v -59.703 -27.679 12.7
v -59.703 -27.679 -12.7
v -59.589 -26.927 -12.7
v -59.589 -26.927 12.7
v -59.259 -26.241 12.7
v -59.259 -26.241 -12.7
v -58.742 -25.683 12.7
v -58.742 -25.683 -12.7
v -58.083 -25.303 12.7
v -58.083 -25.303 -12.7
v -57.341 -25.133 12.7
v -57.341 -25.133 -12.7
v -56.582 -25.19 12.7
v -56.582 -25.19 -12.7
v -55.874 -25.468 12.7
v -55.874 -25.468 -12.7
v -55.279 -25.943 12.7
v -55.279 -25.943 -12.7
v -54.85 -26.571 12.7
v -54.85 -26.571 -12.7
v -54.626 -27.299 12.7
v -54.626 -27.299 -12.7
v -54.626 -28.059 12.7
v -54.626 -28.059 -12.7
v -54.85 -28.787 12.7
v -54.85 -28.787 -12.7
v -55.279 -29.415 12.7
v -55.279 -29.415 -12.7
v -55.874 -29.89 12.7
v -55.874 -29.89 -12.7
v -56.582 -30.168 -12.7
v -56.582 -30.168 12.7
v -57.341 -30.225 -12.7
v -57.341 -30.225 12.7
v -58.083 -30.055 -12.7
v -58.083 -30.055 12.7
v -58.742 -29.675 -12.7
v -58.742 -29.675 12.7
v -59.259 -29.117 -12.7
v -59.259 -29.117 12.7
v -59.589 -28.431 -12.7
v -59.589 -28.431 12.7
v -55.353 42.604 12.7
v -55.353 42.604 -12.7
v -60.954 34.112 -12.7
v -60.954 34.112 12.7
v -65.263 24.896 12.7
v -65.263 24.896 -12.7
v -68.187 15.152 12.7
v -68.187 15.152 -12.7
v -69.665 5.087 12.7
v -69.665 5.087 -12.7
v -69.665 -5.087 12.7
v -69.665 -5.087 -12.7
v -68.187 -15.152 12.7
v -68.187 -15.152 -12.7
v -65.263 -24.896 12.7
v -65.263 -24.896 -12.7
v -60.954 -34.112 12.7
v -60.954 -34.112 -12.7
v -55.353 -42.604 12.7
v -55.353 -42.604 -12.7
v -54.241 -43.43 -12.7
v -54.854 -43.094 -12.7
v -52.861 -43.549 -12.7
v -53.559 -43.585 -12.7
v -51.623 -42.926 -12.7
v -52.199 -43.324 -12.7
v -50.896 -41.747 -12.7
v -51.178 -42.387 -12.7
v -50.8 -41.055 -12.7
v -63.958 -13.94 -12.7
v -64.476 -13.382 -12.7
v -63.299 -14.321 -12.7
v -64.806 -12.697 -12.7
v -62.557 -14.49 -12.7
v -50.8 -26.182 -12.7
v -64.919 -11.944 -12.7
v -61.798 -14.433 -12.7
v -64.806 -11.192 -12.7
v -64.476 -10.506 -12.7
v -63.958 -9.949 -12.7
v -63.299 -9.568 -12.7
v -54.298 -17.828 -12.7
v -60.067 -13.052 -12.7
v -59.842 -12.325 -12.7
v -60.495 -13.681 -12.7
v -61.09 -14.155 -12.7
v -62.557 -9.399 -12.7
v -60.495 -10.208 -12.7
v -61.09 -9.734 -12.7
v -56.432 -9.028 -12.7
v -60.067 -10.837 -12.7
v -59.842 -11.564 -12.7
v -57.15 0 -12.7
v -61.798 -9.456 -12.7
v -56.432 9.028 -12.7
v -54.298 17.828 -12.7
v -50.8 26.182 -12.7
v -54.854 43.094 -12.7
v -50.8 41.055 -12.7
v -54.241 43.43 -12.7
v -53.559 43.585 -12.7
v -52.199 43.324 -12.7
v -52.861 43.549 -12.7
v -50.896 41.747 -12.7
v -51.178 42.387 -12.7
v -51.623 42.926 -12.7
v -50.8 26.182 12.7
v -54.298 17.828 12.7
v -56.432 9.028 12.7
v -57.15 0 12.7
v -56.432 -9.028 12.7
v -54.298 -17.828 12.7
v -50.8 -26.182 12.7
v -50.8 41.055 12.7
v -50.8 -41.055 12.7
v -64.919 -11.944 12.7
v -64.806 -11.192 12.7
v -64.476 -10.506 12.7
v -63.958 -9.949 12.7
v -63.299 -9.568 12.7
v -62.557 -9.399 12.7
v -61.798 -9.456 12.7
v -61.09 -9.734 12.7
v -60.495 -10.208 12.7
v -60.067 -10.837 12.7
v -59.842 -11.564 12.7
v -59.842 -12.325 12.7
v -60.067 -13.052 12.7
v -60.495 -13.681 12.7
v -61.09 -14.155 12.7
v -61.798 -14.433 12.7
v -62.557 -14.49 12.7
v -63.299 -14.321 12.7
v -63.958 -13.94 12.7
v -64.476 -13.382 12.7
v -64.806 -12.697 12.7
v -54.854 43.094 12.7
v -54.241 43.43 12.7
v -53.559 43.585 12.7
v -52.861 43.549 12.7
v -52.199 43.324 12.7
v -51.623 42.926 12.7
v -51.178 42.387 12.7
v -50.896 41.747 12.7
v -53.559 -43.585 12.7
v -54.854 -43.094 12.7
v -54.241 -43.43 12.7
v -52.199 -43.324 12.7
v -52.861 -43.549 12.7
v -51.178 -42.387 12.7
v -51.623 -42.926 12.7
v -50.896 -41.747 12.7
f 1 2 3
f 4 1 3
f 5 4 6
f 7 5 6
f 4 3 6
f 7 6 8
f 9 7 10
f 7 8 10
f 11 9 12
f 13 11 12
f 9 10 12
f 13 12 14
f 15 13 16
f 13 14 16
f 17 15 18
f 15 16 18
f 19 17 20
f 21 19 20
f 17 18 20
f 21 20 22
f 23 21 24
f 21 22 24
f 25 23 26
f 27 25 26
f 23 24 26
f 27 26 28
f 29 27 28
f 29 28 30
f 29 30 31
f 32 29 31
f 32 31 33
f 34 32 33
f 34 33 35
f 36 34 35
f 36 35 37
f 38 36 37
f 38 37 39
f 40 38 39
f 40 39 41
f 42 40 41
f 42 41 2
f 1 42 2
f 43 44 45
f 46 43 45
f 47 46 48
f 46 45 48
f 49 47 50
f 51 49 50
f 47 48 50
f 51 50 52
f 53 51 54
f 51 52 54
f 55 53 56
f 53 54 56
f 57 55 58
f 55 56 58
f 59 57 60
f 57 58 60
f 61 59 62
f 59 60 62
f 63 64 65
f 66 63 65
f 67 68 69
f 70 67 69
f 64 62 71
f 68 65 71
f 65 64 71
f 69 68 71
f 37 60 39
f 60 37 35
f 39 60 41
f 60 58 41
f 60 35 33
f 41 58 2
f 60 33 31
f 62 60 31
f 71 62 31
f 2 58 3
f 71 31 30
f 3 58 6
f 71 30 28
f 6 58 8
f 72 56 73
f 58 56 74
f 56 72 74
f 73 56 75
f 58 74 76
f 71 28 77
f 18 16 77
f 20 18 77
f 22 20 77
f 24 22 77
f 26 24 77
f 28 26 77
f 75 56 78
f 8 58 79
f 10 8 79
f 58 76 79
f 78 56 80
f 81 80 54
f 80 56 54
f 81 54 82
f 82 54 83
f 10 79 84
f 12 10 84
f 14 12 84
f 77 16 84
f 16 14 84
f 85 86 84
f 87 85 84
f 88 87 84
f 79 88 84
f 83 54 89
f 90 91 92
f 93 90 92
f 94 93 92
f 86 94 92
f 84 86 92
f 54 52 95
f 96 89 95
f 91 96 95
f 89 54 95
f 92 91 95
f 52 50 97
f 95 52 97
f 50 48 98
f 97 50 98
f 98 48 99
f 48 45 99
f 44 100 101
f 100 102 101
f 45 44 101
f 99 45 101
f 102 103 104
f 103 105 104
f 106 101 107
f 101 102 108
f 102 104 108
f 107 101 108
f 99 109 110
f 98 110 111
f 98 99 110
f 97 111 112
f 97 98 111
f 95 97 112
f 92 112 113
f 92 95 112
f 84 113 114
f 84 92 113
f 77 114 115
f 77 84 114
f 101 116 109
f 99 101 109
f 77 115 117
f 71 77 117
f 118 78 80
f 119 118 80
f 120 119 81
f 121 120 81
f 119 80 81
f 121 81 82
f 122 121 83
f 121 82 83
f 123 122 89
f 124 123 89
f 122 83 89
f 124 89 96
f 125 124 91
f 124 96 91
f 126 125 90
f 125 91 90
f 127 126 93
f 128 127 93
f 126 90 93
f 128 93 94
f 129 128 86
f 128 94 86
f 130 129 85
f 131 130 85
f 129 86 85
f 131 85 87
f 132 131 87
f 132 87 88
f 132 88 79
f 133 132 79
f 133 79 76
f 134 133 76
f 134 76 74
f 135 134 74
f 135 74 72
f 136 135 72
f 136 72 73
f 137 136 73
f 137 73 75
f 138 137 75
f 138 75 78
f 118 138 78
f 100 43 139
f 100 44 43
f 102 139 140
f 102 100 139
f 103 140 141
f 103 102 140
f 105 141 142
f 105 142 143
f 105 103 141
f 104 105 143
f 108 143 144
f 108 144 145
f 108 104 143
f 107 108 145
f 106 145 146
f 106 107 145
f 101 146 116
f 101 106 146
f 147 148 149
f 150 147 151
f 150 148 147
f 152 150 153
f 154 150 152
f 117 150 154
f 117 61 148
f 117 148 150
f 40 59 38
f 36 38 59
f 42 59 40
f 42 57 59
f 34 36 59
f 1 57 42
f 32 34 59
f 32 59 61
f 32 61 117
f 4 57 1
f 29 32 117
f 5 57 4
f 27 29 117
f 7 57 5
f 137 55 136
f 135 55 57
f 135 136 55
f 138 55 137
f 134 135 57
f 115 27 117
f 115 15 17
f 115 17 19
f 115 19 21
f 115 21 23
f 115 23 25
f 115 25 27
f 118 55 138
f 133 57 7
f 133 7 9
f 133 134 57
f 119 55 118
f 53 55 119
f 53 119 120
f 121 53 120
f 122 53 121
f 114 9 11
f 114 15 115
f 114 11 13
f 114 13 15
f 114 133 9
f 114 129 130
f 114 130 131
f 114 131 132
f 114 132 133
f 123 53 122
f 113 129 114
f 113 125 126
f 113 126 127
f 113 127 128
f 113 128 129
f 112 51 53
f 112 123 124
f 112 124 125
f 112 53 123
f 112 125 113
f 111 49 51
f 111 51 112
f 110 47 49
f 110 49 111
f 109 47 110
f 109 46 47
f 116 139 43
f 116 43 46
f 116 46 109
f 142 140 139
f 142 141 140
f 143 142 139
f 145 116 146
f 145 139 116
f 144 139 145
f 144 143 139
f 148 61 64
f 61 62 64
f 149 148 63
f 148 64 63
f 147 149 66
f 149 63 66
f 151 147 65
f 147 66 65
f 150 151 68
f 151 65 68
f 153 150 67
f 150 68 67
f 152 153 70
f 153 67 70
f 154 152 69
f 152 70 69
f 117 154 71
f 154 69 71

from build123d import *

# Parameters (mm, degrees)
BOSS_EXTRUDE1_DEPTH         = 12.7
BOSS_EXTRUDE1_DEPTH_BACK    = 12.7
SKETCH3_R                   = 69.85
SKETCH3_R_2                 = 57.15
CUT_EXTRUDE1_DEPTH          = 102.996102867
TAP_DRILL_FOR_1_4_20_TAP1_D = 5.1054
FILLET1_R                   = 2.54


with BuildPart() as part:
    # Sketch3 → Boss-Extrude1 (new, two sides: drawn at the far end of the back side and taken through both)
    with BuildSketch(Plane.XY.offset(-BOSS_EXTRUDE1_DEPTH_BACK)):
        Circle(SKETCH3_R)
        Circle(SKETCH3_R_2, mode=Mode.SUBTRACT)
    extrude(amount=BOSS_EXTRUDE1_DEPTH + BOSS_EXTRUDE1_DEPTH_BACK)

    # Sketch4 → Cut-Extrude1 (cut, through all)
    with BuildSketch(Plane.XY.offset(12.7)):
        with BuildLine():
            Line((-50.8, 69.120332123), (-50.8, -69.120332123))
            ThreePointArc((-50.8, -69.120332123), (85.780302592, 0), (-50.8, 69.120332123))
        make_face()
    extrude(amount=-CUT_EXTRUDE1_DEPTH, mode=Mode.SUBTRACT)

    # Tap Drill for 1/4-20 Tap1 (through all)
    with Locations(Plane.XY.offset(12.7)):
        with Locations((-57.15, -27.679008291), (-62.366515468, -11.944360527)):
            Hole(TAP_DRILL_FOR_1_4_20_TAP1_D / 2)

    # Fillet1
    fillet1_edges = [part.edges().sort_by_distance(p)[0] for p in [
        (-50.8, 47.941448664, 0),
        (-50.8, -47.941448664, 0),
    ]]
    fillet(fillet1_edges, radius=FILLET1_R)


solid = part.part
